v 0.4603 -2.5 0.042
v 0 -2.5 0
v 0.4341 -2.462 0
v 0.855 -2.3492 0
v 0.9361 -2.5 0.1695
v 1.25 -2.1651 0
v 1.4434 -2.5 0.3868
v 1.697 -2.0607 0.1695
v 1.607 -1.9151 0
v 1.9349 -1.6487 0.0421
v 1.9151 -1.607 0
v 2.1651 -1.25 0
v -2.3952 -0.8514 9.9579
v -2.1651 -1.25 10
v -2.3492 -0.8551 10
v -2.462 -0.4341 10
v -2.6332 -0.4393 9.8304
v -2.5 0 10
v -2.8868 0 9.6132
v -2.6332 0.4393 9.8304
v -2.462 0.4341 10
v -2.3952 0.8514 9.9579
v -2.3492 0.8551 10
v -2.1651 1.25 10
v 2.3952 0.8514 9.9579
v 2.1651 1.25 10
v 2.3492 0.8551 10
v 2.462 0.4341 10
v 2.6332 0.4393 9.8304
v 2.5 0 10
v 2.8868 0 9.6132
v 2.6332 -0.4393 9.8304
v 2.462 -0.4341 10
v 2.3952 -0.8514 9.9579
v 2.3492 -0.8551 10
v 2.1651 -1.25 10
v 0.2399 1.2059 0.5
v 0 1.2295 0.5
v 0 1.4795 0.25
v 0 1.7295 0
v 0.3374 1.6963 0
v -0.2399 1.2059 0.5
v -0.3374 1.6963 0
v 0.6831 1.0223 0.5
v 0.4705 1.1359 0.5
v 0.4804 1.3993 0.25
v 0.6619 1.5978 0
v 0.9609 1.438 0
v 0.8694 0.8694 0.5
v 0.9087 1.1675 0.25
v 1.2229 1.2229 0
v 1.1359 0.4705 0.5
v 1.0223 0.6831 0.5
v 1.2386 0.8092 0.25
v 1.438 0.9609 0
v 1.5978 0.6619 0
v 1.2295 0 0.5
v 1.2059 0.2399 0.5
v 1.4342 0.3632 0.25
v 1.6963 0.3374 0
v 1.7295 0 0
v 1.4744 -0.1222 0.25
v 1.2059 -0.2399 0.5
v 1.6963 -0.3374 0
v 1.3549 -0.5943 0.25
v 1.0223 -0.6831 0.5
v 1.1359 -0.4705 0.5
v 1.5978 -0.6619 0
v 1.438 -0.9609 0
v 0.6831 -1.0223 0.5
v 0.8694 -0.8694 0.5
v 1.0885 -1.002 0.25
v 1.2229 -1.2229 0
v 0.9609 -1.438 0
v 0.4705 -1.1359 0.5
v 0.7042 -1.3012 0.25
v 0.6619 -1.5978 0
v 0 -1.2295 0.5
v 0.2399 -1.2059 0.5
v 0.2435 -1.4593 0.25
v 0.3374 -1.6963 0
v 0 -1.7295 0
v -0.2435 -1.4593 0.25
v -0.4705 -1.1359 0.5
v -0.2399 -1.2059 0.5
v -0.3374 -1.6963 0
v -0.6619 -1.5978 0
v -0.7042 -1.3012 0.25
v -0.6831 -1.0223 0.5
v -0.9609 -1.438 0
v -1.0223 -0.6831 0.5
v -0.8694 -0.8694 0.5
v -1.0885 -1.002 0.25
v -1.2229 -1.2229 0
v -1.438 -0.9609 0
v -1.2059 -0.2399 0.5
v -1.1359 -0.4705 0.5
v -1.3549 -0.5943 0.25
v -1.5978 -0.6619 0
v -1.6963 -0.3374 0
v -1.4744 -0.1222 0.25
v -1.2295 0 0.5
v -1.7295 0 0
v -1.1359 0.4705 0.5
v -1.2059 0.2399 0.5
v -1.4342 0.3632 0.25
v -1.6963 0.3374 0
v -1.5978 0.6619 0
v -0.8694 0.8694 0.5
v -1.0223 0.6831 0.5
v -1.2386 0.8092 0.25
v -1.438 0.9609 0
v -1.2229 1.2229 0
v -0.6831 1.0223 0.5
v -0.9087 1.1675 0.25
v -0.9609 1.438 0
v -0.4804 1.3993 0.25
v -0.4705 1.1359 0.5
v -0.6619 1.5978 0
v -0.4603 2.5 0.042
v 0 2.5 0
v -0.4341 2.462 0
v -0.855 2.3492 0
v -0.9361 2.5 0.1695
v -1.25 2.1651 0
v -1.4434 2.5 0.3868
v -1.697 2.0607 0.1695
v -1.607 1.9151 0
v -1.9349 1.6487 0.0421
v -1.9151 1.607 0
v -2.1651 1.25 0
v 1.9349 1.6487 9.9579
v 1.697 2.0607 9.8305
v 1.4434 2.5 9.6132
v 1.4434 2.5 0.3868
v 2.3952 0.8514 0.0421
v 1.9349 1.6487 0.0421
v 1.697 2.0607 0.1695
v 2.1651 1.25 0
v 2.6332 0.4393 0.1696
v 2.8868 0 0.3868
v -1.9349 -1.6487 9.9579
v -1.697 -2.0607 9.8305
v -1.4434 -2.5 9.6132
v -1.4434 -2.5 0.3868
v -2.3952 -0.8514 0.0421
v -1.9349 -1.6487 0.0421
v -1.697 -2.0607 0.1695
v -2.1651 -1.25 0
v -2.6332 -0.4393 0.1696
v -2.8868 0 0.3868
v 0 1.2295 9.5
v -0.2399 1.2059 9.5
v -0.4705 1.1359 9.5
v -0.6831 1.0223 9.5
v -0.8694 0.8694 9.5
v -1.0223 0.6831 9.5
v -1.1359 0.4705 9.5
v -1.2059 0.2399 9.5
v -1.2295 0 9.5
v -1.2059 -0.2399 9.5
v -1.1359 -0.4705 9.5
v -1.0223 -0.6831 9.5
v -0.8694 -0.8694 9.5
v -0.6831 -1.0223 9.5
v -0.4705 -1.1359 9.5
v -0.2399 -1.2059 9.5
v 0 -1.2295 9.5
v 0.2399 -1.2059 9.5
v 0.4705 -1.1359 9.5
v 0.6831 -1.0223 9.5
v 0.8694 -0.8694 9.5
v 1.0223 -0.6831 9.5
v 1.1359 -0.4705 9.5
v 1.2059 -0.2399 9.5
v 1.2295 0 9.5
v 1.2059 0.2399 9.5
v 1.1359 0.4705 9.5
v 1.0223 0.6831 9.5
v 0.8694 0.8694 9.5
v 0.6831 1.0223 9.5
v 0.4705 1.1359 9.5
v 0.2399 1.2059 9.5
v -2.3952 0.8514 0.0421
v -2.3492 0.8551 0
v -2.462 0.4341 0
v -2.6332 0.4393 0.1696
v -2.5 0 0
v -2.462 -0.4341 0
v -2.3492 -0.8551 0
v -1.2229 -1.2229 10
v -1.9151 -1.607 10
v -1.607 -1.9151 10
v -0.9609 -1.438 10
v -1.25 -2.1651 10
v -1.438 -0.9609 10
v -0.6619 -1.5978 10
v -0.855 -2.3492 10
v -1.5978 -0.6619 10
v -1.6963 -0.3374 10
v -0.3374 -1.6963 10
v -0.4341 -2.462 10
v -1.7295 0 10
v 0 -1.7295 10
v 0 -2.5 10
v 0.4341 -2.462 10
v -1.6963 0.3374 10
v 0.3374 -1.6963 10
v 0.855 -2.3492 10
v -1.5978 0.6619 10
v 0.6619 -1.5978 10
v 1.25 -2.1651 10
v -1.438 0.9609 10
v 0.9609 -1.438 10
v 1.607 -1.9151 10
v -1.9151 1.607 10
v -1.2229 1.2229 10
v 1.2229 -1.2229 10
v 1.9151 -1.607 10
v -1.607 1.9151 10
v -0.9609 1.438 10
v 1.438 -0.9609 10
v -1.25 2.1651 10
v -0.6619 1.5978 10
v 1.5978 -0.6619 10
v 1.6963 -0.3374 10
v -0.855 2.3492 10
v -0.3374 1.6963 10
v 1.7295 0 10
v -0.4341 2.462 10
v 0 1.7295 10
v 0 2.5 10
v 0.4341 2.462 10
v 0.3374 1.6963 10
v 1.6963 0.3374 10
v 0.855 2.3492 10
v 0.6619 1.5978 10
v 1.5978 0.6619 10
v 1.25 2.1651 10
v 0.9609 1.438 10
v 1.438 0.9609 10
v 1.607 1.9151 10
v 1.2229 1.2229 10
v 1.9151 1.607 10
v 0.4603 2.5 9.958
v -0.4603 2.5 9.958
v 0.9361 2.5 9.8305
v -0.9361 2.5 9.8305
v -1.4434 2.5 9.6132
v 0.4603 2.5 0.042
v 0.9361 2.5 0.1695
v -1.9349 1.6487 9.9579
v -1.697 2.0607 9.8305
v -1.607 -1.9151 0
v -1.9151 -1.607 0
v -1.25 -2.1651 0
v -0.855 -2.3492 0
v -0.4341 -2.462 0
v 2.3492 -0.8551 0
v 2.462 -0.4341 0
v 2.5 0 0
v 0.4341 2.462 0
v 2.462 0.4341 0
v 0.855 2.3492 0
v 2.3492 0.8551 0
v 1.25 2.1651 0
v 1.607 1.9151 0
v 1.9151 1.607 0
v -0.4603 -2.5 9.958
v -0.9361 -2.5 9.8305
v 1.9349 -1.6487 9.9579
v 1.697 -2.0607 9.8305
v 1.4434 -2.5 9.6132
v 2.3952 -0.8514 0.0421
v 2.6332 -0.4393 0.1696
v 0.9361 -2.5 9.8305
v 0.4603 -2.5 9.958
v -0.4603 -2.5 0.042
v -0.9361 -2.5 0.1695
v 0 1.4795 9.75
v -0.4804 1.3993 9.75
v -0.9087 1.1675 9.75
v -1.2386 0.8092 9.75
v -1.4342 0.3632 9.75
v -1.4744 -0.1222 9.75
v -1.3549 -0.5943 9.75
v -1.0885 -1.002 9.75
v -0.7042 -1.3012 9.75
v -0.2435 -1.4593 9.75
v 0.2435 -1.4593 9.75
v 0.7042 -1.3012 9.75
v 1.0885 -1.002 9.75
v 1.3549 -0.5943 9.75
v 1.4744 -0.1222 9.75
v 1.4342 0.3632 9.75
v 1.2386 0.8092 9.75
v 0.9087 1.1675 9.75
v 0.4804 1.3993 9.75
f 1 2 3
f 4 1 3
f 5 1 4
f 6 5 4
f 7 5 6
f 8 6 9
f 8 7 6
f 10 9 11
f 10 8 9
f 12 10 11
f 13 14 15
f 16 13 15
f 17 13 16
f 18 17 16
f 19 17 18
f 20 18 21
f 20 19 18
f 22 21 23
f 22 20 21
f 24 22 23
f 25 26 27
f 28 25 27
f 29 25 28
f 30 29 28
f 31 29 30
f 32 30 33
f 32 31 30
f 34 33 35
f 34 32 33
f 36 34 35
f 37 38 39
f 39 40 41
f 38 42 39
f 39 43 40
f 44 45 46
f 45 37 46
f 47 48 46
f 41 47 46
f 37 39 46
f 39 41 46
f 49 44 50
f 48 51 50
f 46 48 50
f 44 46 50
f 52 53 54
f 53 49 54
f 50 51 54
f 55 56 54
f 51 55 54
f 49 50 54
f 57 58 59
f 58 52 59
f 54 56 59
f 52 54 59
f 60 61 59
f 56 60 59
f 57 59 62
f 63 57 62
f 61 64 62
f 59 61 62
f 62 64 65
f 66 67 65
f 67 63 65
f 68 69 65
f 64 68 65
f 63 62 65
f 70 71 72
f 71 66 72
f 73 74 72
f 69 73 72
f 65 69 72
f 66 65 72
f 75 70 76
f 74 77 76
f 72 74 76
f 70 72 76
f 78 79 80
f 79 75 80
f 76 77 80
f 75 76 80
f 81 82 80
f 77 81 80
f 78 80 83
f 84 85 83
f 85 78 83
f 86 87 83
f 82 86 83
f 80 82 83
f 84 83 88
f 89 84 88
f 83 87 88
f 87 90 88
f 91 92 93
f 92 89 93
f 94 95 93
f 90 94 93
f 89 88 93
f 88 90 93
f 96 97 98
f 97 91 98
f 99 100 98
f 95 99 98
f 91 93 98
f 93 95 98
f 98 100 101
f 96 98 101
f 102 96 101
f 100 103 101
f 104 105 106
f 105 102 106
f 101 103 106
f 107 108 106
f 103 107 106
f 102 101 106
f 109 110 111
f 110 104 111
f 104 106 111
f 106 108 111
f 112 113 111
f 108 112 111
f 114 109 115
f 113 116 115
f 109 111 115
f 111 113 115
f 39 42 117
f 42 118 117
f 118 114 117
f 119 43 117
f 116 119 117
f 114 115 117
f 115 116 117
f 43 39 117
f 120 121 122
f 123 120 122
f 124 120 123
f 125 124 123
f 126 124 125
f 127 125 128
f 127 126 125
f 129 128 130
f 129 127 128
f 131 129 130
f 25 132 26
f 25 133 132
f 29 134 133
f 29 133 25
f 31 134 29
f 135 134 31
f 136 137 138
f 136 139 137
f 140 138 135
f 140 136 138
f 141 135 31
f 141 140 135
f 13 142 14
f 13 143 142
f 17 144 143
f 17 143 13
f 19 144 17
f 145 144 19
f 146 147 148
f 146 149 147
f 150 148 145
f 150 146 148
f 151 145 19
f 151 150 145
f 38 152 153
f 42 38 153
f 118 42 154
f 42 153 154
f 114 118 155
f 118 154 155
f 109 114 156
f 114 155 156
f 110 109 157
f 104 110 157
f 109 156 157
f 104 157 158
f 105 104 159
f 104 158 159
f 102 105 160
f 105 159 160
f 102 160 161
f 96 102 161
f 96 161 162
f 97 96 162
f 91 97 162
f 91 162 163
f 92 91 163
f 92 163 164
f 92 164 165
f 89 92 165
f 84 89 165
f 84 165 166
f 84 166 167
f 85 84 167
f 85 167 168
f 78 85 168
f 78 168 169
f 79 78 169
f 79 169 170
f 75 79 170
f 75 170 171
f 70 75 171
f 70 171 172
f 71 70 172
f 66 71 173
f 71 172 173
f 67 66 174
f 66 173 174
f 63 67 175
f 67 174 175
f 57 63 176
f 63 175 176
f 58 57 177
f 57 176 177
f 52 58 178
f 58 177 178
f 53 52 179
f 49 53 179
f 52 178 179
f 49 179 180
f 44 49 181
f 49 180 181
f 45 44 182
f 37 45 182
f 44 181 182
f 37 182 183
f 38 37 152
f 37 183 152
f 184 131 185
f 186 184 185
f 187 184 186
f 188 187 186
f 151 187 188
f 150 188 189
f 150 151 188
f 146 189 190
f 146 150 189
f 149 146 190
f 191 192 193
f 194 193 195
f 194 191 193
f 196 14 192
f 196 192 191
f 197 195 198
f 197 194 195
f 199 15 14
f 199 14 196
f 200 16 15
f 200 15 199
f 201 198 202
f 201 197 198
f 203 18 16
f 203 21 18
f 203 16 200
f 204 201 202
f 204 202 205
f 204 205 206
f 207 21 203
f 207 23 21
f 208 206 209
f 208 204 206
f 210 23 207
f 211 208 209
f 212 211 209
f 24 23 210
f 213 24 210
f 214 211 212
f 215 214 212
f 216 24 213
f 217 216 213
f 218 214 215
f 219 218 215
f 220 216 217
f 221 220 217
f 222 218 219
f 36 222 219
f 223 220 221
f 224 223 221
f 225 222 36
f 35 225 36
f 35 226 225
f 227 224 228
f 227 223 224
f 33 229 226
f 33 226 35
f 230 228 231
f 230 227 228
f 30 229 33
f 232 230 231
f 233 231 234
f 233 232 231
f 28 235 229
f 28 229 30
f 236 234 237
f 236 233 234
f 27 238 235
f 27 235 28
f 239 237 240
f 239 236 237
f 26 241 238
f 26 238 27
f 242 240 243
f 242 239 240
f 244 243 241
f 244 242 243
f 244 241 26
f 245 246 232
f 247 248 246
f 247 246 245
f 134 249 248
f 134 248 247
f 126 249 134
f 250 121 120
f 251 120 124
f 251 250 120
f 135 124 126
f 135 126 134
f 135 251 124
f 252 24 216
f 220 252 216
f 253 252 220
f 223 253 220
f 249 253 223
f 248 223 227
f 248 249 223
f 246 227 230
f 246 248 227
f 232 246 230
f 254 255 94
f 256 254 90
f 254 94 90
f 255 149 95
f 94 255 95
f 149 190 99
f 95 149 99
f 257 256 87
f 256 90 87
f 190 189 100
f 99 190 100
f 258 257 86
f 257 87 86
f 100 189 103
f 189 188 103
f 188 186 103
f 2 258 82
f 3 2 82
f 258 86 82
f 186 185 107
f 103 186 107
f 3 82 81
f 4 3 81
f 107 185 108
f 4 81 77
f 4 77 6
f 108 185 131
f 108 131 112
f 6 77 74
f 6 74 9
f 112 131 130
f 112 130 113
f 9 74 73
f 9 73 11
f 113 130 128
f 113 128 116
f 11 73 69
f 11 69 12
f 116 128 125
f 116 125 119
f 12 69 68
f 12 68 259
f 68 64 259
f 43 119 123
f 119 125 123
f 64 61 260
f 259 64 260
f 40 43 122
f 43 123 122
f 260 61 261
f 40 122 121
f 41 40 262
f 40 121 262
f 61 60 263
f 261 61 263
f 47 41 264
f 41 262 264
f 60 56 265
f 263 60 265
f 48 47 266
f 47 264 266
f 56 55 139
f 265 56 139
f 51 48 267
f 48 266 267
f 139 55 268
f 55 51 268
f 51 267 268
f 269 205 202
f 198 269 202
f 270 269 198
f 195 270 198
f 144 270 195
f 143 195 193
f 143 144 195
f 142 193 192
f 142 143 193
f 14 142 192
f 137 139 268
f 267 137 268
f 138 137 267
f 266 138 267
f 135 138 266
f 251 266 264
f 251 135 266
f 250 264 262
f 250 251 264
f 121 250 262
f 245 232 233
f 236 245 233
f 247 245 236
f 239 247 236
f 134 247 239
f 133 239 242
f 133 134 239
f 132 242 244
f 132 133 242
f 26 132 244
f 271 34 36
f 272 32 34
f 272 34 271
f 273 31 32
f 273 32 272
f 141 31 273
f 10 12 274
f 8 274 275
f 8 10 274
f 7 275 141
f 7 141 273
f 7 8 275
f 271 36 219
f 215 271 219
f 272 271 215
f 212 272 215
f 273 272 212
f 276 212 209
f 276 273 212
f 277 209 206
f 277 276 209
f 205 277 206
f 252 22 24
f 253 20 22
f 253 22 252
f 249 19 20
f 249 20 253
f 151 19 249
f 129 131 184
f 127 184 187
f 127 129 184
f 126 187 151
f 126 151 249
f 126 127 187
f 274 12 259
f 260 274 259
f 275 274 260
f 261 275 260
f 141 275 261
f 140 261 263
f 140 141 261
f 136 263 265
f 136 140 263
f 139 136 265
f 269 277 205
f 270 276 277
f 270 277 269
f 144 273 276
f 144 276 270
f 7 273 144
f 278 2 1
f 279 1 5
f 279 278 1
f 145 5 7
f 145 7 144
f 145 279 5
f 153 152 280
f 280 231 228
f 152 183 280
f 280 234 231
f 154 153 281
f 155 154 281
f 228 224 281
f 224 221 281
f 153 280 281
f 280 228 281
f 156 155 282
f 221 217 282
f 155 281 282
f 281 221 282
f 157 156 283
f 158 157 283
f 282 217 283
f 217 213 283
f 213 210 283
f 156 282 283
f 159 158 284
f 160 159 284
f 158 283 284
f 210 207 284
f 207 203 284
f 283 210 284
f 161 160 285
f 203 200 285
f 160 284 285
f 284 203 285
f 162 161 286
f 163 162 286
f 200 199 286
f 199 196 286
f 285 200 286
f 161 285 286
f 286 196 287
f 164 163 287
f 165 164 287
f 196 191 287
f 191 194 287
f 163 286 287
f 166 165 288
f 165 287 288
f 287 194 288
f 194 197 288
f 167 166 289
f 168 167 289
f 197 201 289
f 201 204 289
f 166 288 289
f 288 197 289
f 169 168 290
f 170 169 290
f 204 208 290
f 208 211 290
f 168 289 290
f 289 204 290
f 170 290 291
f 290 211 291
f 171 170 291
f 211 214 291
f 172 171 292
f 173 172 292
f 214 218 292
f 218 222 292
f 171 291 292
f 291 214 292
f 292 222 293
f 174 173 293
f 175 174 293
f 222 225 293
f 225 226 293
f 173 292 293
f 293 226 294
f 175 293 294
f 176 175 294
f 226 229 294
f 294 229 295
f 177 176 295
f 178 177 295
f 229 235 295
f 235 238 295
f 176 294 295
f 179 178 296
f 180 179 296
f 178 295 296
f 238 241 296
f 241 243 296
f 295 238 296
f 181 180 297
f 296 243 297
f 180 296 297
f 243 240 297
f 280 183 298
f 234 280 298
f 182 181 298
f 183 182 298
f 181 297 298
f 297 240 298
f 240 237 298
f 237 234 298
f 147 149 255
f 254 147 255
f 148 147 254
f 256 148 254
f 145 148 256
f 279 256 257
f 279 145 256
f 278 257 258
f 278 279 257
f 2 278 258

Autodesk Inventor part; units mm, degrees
ref_plane "YZ Plane" through (0, 0, 0) normal (1, 0, 0) x (0, 1, 0)
ref_plane "XZ Plane" through (0, 0, 0) normal (0, 1, 0) x (-1, 0, 0)
ref_plane "XY Plane" through (0, 0, 0) normal (0, 0, 1) x (1, 0, 0)
sketch "Sketch1" plane through (0, 0, 0) normal (0, 0, 1) x (1, 0, 0)
  line L0 (1.4434, 2.5) -> (2.8868, 0)
  line L1 (2.8868, 0) -> (1.4434, -2.5)
  line L2 (1.4434, -2.5) -> (-1.4434, -2.5)
  line L3 (-1.4434, -2.5) -> (-2.8868, 0)
  line L4 (-2.8868, 0) -> (-1.4434, 2.5)
  line L5 (-1.4434, 2.5) -> (1.4434, 2.5)
  point P0 (0, 0)
  point P1 (0, 0)
  dimension "d0" = 5
extrude "Extrusion1" add sketch "Sketch1" along normal blind 10
sketch "Sketch3" plane through (0, 0, 0) normal (0, 0, -1) x (-1, 0, 0)
  line L0 (1.4434, 2.5) -> (-1.4434, 2.5) projected
  circle A0 centre (0, 0) radius 2.5
hole "Hole1" at (0, 0, 0) direction (0, 0, 1) diameter 2.459 end through all thread size "M3x0.5" class "6H" standard "ISO Metric profile"
chamfer "Chamfer2" distance 0.5 angle 45 1 edges at (0, -1.2295, 0)
sketch "Sketch4" plane through (0, 0, 0) normal (0, 0, -1) x (-1, 0, 0)
  circle A0 centre (0, 0) radius 1.7295 projected
  circle A1 centre (0, 0) radius 2.5
  circle A2 centre (0, 0) radius 6
extrude "Extrusion3" cut sketch "Sketch4" against normal blind 1 draft -45 contours A2
ref_plane "Work Plane1" through (0, 0, 5) normal (0, 0, -1) x (-1, 0, 0)
mirror "Mirror2" about plane through (0, 0, 5) normal (0, 0, -1) of "Extrusion3"
chamfer "Chamfer3" distance 0.5 angle 45 1 edges at (0, -1.2295, 10)
properties part number "support m3 10" material "Stainless Steel"
